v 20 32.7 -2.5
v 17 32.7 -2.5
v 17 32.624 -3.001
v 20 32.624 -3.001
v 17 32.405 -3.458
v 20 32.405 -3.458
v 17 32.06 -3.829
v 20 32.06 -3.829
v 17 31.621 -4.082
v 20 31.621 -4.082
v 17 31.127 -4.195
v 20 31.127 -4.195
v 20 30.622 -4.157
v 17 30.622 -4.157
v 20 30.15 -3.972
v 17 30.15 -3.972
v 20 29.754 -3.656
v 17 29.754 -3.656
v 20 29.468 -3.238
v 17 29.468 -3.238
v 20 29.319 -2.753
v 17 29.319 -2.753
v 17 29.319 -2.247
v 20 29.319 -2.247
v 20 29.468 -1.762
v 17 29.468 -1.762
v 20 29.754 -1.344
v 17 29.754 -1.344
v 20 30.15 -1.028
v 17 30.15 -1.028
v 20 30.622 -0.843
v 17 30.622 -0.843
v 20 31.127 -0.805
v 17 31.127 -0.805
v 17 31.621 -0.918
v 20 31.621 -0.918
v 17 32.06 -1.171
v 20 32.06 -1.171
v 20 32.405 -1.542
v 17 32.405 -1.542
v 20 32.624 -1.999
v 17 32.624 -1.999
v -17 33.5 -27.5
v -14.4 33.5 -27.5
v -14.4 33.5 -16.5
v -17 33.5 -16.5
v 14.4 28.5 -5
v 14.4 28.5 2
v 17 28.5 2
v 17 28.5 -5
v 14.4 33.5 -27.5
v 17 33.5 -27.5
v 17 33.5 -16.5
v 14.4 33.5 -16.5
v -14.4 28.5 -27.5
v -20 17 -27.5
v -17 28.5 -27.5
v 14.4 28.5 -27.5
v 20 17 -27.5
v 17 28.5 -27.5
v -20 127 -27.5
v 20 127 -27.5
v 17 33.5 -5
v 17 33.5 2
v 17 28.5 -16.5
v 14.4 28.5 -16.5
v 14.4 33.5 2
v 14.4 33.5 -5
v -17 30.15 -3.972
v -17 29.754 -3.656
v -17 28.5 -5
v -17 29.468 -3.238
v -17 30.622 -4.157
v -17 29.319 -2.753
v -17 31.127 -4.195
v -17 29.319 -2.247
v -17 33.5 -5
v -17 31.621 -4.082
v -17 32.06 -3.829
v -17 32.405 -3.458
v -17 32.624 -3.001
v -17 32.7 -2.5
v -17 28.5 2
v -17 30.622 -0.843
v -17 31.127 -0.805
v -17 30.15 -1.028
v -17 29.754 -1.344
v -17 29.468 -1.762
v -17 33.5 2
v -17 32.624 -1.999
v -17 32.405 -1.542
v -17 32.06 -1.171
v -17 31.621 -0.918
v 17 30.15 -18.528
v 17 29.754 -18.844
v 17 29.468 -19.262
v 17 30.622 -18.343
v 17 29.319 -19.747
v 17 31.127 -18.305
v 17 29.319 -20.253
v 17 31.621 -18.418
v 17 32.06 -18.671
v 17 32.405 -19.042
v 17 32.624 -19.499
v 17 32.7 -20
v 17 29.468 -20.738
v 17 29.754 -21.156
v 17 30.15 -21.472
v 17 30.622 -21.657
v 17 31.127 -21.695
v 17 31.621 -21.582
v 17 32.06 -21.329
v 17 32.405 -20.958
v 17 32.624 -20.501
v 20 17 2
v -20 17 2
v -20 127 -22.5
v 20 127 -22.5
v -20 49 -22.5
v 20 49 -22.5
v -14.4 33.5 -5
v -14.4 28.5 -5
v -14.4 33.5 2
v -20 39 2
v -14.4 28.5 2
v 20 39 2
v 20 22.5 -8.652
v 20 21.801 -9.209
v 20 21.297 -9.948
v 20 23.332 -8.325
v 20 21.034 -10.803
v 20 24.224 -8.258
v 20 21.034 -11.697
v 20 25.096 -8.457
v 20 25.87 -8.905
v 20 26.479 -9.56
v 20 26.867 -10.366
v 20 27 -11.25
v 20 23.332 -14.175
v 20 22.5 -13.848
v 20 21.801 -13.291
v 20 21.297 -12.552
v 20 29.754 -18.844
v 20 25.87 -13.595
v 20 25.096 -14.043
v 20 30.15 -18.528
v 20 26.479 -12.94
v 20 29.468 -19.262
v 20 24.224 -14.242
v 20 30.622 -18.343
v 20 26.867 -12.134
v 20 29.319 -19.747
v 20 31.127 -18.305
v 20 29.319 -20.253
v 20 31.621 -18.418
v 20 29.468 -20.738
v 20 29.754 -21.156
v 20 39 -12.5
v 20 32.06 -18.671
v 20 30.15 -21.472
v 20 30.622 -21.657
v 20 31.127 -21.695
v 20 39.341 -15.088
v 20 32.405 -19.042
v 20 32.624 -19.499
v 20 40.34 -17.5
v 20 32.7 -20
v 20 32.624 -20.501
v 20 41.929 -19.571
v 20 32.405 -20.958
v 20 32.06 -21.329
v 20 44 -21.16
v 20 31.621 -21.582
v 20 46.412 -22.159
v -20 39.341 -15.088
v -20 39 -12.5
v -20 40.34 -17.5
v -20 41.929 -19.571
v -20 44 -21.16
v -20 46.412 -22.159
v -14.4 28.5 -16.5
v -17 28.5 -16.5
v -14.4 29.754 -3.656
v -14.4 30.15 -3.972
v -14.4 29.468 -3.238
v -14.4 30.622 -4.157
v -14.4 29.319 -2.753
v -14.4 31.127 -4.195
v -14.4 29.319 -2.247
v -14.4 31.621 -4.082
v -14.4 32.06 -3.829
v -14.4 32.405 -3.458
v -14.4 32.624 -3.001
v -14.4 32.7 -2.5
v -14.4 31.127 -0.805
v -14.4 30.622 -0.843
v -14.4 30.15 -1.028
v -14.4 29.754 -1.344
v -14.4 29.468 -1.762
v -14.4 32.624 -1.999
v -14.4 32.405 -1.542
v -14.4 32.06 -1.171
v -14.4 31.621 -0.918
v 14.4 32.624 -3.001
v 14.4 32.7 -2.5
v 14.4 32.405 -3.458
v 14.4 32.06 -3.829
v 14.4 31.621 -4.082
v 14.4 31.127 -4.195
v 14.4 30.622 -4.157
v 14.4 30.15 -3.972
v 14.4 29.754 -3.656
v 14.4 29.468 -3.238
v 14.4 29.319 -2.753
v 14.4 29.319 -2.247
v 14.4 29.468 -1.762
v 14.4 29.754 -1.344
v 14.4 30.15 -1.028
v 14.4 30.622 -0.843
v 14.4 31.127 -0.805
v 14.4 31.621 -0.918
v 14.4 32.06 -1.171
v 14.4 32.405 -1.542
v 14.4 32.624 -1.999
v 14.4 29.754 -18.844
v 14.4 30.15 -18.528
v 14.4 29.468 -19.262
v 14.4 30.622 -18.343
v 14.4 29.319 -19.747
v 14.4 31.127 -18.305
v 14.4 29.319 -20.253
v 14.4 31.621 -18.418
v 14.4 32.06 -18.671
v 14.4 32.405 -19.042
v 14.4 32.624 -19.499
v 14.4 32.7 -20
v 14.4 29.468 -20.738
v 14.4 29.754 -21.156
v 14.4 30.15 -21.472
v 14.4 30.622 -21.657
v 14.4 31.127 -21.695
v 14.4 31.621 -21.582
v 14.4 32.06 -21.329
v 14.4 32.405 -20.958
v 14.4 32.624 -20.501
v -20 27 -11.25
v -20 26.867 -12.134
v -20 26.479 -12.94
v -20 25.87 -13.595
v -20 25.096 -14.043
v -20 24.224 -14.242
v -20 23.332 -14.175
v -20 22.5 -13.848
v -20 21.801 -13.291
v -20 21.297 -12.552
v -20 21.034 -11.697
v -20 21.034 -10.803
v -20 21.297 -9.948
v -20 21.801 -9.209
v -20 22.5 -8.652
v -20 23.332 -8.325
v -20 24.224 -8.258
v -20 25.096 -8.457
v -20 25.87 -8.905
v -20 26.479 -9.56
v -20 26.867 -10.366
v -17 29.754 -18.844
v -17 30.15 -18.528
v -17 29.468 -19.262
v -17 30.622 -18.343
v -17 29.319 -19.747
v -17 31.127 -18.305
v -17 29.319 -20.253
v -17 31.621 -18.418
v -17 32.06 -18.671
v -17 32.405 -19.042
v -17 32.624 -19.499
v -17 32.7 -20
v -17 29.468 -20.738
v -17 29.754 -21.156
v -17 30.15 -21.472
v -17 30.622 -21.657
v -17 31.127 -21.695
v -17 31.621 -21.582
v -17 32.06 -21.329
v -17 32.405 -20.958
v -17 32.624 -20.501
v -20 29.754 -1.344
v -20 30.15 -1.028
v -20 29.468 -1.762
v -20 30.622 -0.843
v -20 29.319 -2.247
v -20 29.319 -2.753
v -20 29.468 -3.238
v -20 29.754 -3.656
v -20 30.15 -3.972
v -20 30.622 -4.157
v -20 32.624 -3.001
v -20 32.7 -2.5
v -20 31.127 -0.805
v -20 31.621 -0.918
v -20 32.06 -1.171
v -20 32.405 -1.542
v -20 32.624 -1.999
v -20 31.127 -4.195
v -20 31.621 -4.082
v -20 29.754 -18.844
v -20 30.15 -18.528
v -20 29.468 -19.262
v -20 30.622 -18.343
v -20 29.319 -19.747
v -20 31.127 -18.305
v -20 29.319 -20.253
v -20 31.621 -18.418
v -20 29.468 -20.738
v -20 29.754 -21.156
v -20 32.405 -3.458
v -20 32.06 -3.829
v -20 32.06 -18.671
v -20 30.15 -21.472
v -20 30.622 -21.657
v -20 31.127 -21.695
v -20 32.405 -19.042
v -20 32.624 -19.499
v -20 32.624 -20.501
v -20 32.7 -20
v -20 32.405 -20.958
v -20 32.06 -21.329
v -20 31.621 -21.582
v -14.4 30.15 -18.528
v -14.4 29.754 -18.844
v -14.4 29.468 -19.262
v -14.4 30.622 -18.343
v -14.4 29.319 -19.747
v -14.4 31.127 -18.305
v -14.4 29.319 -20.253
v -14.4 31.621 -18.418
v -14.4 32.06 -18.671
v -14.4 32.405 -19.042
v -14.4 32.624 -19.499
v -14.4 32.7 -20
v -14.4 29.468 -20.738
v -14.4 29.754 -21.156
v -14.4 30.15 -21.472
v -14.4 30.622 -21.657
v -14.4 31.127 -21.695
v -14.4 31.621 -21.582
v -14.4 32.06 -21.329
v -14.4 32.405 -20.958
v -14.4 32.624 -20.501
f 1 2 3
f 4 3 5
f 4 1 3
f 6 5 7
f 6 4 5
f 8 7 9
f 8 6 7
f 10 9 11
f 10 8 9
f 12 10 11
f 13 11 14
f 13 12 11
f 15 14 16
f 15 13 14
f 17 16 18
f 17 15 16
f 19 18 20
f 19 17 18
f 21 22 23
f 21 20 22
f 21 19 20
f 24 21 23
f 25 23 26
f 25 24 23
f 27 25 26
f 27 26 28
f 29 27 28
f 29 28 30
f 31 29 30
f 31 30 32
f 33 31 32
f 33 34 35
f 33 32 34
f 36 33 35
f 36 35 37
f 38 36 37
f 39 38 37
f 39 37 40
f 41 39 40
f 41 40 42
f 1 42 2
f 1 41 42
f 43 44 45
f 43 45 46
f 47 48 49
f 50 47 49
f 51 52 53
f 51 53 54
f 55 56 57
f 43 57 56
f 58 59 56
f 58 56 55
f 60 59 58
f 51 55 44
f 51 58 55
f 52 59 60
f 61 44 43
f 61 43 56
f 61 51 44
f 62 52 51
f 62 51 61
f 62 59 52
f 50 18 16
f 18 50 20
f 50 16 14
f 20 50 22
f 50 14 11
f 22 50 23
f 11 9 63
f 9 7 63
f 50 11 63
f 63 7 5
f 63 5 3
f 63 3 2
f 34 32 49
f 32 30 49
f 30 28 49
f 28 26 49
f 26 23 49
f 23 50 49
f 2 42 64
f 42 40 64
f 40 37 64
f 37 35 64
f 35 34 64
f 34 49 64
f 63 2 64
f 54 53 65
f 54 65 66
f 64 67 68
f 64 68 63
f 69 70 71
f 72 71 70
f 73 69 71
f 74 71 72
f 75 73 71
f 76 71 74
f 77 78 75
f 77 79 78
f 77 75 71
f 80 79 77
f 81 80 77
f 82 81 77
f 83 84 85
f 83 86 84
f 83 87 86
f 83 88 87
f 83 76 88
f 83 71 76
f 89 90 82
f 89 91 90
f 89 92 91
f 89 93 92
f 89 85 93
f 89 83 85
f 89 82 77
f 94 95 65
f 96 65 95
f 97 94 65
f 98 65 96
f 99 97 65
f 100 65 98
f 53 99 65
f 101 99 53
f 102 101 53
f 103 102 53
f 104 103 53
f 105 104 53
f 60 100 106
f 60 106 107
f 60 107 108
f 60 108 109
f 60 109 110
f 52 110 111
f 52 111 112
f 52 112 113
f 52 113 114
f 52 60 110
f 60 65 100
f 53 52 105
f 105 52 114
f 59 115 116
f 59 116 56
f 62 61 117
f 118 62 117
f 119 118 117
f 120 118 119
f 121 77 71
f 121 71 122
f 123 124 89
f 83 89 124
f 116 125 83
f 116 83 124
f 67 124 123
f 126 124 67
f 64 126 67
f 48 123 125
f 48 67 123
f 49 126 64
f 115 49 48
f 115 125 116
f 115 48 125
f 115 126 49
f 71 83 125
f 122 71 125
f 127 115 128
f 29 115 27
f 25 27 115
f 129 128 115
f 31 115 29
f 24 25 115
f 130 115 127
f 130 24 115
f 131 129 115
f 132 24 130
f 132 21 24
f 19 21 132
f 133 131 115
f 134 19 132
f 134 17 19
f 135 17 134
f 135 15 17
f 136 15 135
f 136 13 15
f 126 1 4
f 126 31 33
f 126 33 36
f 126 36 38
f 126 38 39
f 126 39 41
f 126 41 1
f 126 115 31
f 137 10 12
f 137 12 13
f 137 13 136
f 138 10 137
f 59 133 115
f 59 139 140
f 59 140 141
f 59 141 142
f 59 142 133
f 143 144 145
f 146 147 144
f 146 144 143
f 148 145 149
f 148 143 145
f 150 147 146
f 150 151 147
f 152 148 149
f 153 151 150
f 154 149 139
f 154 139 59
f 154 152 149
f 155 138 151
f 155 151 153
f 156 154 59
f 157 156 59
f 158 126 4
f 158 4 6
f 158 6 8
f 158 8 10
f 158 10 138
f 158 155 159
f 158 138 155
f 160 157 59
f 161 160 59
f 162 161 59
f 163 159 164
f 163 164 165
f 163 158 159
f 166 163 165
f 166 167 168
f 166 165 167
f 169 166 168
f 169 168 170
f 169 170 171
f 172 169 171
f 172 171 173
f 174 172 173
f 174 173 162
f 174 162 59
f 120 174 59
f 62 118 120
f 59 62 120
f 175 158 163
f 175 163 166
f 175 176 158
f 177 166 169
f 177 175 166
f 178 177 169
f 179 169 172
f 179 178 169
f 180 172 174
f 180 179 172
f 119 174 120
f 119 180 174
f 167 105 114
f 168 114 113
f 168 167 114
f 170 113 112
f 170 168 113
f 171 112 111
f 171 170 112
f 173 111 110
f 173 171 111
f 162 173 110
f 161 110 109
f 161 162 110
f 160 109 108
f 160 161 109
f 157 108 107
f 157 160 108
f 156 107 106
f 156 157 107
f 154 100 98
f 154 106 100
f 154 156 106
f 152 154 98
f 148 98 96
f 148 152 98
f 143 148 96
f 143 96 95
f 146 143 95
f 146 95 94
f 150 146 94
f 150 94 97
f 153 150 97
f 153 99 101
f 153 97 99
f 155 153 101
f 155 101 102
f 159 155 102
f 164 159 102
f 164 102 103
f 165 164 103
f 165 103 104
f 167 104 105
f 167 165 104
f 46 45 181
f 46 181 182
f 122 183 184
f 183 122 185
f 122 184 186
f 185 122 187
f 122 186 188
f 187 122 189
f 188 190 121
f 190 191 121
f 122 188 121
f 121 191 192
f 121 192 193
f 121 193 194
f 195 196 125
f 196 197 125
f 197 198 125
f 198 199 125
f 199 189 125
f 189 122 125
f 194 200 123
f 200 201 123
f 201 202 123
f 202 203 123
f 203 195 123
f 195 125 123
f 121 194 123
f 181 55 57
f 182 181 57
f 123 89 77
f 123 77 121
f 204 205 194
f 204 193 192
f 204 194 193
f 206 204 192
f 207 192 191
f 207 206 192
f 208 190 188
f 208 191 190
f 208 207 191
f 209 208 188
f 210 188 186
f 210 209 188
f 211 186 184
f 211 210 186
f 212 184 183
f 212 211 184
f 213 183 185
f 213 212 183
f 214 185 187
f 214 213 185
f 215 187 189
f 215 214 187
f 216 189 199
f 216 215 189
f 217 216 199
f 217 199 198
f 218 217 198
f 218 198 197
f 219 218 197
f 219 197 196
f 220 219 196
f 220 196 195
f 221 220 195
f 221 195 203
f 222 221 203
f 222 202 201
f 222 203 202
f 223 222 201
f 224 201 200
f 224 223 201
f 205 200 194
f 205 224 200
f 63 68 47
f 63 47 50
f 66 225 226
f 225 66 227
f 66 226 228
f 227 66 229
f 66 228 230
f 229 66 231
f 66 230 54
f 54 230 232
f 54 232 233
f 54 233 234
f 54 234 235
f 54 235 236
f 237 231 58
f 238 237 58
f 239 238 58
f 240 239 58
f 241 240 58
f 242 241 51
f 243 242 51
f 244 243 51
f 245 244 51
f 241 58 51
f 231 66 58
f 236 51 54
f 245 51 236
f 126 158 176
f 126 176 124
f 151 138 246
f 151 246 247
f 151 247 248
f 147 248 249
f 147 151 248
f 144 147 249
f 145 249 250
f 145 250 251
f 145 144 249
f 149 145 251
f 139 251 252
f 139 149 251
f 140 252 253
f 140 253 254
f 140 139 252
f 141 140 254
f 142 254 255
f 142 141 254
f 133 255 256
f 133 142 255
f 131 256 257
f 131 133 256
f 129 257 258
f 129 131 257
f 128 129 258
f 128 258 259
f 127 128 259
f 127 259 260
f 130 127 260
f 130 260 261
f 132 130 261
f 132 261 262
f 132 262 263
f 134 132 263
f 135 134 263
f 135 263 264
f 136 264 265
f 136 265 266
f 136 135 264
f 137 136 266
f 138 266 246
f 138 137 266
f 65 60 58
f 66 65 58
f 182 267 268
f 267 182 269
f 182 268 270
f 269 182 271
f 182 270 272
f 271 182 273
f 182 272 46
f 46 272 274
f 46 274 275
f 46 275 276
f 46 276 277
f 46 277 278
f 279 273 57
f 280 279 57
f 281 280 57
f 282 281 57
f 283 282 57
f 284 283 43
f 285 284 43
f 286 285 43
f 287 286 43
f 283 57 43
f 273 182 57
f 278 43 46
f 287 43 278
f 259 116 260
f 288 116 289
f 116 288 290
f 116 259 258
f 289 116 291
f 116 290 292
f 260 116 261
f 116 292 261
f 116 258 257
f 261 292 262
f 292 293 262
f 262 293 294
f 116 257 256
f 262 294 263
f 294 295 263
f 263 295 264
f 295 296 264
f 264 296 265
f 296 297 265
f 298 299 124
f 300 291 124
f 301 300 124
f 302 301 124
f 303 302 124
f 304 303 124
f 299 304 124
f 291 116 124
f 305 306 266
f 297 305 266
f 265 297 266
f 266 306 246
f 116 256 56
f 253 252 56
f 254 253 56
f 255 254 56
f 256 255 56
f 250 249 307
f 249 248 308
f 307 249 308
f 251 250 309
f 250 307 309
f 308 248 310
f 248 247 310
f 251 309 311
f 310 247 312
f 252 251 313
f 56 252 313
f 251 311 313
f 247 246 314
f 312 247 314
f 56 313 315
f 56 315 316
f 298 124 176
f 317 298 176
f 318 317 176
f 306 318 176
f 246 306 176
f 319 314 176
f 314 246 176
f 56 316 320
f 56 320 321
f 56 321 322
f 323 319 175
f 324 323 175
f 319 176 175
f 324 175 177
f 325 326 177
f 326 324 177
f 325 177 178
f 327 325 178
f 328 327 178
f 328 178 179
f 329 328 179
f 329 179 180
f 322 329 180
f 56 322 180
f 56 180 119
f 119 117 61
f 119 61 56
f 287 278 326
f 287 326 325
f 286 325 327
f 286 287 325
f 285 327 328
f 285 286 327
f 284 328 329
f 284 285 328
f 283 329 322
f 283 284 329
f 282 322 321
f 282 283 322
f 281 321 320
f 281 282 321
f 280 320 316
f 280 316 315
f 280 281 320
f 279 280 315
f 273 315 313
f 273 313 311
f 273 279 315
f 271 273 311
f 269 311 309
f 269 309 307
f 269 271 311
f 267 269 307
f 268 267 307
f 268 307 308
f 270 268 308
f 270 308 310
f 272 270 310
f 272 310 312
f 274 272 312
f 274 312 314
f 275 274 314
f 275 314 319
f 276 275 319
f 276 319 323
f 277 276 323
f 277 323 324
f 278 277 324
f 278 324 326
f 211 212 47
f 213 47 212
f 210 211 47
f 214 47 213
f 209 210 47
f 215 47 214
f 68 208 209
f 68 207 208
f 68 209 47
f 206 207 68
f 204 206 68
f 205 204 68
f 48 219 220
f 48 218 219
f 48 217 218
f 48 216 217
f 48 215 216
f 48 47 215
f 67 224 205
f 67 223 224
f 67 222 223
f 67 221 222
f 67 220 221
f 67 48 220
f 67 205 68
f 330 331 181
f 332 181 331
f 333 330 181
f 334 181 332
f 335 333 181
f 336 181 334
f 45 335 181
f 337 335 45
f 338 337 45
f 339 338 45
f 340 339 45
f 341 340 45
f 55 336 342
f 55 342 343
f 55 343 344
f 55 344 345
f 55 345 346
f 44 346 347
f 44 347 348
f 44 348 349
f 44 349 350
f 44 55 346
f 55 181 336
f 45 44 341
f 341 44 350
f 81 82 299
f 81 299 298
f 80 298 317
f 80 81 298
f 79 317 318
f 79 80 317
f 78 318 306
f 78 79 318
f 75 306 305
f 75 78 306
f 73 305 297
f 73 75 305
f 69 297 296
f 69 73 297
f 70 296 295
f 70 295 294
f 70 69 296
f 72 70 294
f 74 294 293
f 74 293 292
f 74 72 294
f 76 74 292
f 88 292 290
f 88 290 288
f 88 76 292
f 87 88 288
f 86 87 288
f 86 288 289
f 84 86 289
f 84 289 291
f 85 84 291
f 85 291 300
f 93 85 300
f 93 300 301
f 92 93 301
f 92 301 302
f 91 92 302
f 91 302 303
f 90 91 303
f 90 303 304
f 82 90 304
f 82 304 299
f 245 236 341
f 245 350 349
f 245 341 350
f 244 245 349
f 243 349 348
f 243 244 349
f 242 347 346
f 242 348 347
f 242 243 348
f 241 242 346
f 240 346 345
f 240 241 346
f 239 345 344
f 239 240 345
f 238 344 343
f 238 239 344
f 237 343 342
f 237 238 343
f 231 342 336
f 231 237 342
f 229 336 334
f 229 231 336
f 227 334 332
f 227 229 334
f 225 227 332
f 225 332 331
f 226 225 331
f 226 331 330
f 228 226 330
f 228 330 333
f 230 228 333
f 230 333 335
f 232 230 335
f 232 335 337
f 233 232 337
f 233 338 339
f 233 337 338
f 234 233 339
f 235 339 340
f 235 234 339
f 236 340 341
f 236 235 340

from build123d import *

# Parameters (mm, degrees)
SKETCH1_R           = 3
SKETCH1_R_2         = 1.7
BOSS_EXTRUDE1_DEPTH = 40
FILLET1_R           = 10
SKETCH2_W           = 2.6
SKETCH2_H           = 5
CUT_EXTRUDE1_DEPTH  = 7
SKETCH3_W           = 2.6
SKETCH3_H           = 5
CUT_EXTRUDE2_DEPTH  = 11


with BuildPart() as part:
    # Sketch1 → Boss-Extrude1 (new body)
    with BuildSketch(Plane.ZY.offset(-20)):
        Polygon((2, 17), (-27.5, 17), (-27.5, 127), (-22.5, 127), (-22.5, 39), (2, 39), align=None)
        with Locations(Location((-11.25, 24, 0), (0, 0, 90))):
            Circle(SKETCH1_R, mode=Mode.SUBTRACT)
        with Locations(Location((-2.5, 31, 0), (0, 0, 90))):
            Circle(SKETCH1_R_2, mode=Mode.SUBTRACT)
        with Locations(Location((-20, 31, 0), (0, 0, 90))):
            Circle(SKETCH1_R_2, mode=Mode.SUBTRACT)
    extrude(amount=BOSS_EXTRUDE1_DEPTH)

    # Fillet1
    fillet1_edges = [part.edges().sort_by_distance(p)[0] for p in [
        (0, 39, -22.5),
    ]]
    fillet(fillet1_edges, radius=FILLET1_R)

    # Sketch2 → Cut-Extrude1 (cut)
    with BuildSketch(Plane.XY.offset(2)):
        with Locations((15.7, 31)):
            Rectangle(SKETCH2_W, SKETCH2_H)
        with Locations((-15.7, 31)):
            Rectangle(SKETCH2_W, SKETCH2_H)
    extrude(amount=-CUT_EXTRUDE1_DEPTH, mode=Mode.SUBTRACT)

    # Sketch3 → Cut-Extrude2 (cut)
    with BuildSketch(Plane(origin=(0, 0, -27.5), x_dir=(-1, 0, 0), z_dir=(0, 0, -1))):
        with Locations((15.7, 31)):
            Rectangle(SKETCH3_W, SKETCH3_H)
        with Locations((-15.7, 31)):
            Rectangle(SKETCH3_W, SKETCH3_H)
    extrude(amount=-CUT_EXTRUDE2_DEPTH, mode=Mode.SUBTRACT)


solid = part.part
